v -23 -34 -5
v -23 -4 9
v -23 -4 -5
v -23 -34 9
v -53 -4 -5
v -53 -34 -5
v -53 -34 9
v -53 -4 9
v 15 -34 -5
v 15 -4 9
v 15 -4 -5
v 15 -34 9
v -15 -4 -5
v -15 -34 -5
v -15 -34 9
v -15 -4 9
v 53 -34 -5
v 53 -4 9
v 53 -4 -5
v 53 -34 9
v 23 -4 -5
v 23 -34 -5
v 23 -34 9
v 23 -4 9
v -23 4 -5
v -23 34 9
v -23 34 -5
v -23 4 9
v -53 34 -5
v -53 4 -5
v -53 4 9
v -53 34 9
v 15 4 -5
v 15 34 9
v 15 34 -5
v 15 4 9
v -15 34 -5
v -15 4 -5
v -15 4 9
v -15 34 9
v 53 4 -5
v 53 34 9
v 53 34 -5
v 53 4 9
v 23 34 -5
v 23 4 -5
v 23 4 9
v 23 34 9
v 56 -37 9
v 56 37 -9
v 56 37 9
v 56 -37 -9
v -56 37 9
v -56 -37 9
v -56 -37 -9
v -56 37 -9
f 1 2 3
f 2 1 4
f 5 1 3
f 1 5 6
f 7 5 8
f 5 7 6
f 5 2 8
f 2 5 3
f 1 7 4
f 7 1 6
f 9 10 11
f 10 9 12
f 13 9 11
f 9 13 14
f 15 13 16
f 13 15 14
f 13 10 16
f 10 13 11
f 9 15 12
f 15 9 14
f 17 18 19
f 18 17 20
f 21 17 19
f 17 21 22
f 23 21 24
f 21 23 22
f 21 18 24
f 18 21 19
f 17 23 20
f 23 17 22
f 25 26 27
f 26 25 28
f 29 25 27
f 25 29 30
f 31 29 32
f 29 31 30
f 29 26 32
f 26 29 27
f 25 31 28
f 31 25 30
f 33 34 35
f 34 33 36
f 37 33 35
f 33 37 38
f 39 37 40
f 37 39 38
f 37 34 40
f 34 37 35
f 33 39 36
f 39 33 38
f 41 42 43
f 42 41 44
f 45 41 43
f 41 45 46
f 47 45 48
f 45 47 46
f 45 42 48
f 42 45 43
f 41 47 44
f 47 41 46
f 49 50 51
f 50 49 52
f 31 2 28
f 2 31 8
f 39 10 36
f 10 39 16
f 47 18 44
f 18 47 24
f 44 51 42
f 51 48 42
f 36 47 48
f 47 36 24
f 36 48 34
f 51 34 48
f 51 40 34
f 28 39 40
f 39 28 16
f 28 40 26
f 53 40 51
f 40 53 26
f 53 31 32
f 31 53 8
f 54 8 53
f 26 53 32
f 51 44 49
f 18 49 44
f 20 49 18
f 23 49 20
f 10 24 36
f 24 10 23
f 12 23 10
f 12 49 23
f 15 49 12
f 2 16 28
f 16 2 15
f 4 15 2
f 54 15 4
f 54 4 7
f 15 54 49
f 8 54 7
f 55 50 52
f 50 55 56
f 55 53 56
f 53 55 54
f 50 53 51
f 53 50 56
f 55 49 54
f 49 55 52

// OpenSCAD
$fn = 32;

// ----------------------------------------------------------------------
// Pocket plate 112 x 74 x 18
// 2 x 3 pockets 30 mm square, 14 mm deep
// ----------------------------------------------------------------------

// --- parameters (mm) ---
thickness = 18;  // plate thickness
floor_t = 4;     // material left under each pocket
pocket = 30;     // pocket side length
pitch_x = 38;    // pocket pitch along X
pitch_y = 38;    // pocket pitch along Y
cols = 3;        // pockets per row
rows = 2;        // rows of pockets

// --- derived feature positions (mm) ---
depth = thickness - floor_t;        // = 14   pocket depth, down to the floor
span_x = (cols - 1) * pitch_x;      // = 76   distance between outer pockets
span_y = (rows - 1) * pitch_y;      // = 38   distance between outer pocket rows
origin_x = -span_x / 2;             // = -38   X of the first pocket
origin_y = -span_y / 2;             // = -19   Y of the first pocket
plate = [span_x + pocket + 6, span_y + pocket + 6, thickness];  // = [112, 74, 18]   overall size: pockets plus 3 mm of wall on each side
feature_centers = [
  [origin_x + 0 * pitch_x, origin_y + 0 * pitch_y],
  [origin_x + 1 * pitch_x, origin_y + 0 * pitch_y],
  [origin_x + 2 * pitch_x, origin_y + 0 * pitch_y],
  [origin_x + 0 * pitch_x, origin_y + 1 * pitch_y],
  [origin_x + 1 * pitch_x, origin_y + 1 * pitch_y],
  [origin_x + 2 * pitch_x, origin_y + 1 * pitch_y]
];   // pocket centres, used verbatim by the cutter loop

// plate outline, then one pocket per centre in feature_centers
difference() {
  cube(plate, center = true);
  for (centre = feature_centers)
    translate([centre[0] - pocket / 2, centre[1] - pocket / 2, plate[2] / 2 - depth])
      cube([pocket, pocket, depth + 1]);  // centred on the declared pocket centre
}
